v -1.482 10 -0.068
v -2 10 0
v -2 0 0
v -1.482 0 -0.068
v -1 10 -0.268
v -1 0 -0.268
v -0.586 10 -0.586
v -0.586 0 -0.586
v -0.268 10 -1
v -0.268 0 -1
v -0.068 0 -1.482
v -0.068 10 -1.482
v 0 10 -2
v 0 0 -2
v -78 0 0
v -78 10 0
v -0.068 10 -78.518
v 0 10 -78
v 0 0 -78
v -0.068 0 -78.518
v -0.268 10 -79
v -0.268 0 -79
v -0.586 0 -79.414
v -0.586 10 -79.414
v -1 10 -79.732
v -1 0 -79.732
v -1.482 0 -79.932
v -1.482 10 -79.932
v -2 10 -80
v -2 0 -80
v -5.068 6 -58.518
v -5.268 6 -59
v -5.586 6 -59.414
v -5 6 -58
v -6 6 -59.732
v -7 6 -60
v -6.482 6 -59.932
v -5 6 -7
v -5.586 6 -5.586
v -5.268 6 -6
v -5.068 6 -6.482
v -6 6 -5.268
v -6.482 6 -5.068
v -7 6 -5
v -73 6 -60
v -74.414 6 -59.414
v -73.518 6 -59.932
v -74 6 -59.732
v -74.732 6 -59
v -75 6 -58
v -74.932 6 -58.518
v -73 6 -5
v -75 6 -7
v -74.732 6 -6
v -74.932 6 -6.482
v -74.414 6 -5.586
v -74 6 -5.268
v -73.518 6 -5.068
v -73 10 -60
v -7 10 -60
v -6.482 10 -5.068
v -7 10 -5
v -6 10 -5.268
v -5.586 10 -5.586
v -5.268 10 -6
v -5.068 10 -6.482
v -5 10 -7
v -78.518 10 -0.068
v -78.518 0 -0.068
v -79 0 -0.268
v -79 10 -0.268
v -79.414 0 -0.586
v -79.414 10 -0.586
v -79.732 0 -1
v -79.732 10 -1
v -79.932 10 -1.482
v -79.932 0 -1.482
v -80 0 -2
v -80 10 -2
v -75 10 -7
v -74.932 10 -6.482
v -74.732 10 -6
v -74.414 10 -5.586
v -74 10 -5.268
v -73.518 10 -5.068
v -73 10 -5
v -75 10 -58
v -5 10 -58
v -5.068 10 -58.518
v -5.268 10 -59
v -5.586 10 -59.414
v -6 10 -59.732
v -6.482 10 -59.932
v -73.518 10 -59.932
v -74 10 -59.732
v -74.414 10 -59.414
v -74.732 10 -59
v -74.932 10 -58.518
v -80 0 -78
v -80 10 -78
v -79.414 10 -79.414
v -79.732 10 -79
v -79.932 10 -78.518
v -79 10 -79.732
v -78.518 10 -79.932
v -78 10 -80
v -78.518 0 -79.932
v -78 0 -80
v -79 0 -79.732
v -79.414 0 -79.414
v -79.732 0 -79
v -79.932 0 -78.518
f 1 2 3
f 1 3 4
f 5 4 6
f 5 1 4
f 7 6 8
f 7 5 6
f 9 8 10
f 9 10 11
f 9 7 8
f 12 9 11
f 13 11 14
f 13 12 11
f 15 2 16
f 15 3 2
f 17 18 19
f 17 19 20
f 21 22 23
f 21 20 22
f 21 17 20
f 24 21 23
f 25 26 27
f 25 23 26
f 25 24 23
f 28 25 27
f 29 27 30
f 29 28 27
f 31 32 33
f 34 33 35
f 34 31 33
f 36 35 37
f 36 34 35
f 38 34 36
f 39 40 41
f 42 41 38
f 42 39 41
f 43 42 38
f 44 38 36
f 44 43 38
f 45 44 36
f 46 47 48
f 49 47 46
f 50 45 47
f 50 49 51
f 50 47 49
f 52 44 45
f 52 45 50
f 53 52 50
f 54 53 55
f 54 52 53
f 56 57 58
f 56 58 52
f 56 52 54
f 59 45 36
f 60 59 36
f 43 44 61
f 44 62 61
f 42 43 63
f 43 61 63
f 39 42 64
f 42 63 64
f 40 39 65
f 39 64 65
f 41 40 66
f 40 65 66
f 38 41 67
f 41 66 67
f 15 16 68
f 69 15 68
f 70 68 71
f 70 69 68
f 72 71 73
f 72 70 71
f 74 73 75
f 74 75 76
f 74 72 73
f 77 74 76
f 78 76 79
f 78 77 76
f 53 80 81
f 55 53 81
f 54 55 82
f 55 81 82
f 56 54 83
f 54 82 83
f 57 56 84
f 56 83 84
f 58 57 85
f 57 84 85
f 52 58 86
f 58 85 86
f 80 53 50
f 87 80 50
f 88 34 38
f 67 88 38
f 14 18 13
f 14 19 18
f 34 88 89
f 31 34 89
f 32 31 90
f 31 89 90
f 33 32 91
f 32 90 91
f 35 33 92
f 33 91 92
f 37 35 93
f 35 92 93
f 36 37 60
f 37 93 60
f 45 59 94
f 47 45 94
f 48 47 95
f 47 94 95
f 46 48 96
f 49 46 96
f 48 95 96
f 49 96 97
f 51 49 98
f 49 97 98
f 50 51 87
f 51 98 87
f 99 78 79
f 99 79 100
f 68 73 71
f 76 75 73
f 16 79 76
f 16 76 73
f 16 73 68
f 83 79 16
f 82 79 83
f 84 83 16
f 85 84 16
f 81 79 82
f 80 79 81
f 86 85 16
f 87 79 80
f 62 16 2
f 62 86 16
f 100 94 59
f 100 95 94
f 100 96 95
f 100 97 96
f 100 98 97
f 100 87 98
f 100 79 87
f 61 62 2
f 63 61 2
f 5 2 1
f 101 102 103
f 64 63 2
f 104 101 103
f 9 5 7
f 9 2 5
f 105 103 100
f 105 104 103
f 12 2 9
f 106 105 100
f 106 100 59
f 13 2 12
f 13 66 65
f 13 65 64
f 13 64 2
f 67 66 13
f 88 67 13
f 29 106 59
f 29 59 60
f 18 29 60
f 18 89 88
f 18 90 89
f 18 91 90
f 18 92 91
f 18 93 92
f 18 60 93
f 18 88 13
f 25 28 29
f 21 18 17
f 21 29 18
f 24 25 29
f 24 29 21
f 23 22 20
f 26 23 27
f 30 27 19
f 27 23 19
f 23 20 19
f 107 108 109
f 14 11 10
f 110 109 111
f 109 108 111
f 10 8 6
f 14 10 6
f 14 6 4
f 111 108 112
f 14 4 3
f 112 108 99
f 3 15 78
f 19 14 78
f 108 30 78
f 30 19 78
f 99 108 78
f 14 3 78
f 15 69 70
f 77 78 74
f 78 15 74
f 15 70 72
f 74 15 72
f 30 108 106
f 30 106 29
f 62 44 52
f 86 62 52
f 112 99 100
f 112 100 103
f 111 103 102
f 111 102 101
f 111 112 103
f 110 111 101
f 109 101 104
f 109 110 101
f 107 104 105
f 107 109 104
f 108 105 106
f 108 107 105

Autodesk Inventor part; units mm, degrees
ref_plane "YZ Plane" through (0, 0, 0) normal (1, 0, 0) x (0, 1, 0)
ref_plane "XZ Plane" through (0, 0, 0) normal (0, 1, 0) x (-1, 0, 0)
ref_plane "XY Plane" through (0, 0, 0) normal (0, 0, 1) x (1, 0, 0)
sketch "Sketch1" plane through (0, 0, 0) normal (0, 1, 0) x (-1, 0, 0)
  line L0 (0, 0) -> (80, 0)
  line L1 (80, 0) -> (80, -80)
  line L2 (80, -80) -> (0, -80)
  line L3 (0, -80) -> (0, 0)
  dimension "d0" = 80
  dimension "d1" = 80
extrude "Extrusion1" add sketch "Sketch1" along normal blind 6
sketch "Sketch2" plane through (0, 6, 0) normal (0, 1, 0) x (1, 0, 0)
  line L0 (-5, 5) -> (-75, 5)
  line L1 (-75, 5) -> (-75, 60)
  line L2 (-75, 60) -> (-5, 60)
  line L3 (-5, 60) -> (-5, 5)
  line L4 (0, 0) -> (0, 80) projected
  line L5 (-80, 0) -> (0, 0) projected
  line L6 (-80, 80) -> (-80, 0) projected
  line L7 (0, 80) -> (-80, 80) projected
  line L8 (-80, 0) -> (0, 0)
  line L9 (0, 0) -> (0, 80)
  line L10 (0, 80) -> (-80, 80)
  line L11 (-80, 80) -> (-80, 0)
  dimension "d8" = 70
  dimension "d9" = 55
  dimension "d10" = 5
  dimension "d11" = 5
extrude "Extrusion2" add sketch "Sketch2" along normal blind 4
fillet "Fillet1" radius 2 4 edges at (-75, 8, -60) (-5, 8, -60) (-5, 8, -5) (-75, 8, -5)
fillet "Fillet2" radius 2 4 edges at (0, 5, 0) (0, 5, -80) (-80, 5, -80) (-80, 5, 0)
properties part number "solar-panel-mount"
